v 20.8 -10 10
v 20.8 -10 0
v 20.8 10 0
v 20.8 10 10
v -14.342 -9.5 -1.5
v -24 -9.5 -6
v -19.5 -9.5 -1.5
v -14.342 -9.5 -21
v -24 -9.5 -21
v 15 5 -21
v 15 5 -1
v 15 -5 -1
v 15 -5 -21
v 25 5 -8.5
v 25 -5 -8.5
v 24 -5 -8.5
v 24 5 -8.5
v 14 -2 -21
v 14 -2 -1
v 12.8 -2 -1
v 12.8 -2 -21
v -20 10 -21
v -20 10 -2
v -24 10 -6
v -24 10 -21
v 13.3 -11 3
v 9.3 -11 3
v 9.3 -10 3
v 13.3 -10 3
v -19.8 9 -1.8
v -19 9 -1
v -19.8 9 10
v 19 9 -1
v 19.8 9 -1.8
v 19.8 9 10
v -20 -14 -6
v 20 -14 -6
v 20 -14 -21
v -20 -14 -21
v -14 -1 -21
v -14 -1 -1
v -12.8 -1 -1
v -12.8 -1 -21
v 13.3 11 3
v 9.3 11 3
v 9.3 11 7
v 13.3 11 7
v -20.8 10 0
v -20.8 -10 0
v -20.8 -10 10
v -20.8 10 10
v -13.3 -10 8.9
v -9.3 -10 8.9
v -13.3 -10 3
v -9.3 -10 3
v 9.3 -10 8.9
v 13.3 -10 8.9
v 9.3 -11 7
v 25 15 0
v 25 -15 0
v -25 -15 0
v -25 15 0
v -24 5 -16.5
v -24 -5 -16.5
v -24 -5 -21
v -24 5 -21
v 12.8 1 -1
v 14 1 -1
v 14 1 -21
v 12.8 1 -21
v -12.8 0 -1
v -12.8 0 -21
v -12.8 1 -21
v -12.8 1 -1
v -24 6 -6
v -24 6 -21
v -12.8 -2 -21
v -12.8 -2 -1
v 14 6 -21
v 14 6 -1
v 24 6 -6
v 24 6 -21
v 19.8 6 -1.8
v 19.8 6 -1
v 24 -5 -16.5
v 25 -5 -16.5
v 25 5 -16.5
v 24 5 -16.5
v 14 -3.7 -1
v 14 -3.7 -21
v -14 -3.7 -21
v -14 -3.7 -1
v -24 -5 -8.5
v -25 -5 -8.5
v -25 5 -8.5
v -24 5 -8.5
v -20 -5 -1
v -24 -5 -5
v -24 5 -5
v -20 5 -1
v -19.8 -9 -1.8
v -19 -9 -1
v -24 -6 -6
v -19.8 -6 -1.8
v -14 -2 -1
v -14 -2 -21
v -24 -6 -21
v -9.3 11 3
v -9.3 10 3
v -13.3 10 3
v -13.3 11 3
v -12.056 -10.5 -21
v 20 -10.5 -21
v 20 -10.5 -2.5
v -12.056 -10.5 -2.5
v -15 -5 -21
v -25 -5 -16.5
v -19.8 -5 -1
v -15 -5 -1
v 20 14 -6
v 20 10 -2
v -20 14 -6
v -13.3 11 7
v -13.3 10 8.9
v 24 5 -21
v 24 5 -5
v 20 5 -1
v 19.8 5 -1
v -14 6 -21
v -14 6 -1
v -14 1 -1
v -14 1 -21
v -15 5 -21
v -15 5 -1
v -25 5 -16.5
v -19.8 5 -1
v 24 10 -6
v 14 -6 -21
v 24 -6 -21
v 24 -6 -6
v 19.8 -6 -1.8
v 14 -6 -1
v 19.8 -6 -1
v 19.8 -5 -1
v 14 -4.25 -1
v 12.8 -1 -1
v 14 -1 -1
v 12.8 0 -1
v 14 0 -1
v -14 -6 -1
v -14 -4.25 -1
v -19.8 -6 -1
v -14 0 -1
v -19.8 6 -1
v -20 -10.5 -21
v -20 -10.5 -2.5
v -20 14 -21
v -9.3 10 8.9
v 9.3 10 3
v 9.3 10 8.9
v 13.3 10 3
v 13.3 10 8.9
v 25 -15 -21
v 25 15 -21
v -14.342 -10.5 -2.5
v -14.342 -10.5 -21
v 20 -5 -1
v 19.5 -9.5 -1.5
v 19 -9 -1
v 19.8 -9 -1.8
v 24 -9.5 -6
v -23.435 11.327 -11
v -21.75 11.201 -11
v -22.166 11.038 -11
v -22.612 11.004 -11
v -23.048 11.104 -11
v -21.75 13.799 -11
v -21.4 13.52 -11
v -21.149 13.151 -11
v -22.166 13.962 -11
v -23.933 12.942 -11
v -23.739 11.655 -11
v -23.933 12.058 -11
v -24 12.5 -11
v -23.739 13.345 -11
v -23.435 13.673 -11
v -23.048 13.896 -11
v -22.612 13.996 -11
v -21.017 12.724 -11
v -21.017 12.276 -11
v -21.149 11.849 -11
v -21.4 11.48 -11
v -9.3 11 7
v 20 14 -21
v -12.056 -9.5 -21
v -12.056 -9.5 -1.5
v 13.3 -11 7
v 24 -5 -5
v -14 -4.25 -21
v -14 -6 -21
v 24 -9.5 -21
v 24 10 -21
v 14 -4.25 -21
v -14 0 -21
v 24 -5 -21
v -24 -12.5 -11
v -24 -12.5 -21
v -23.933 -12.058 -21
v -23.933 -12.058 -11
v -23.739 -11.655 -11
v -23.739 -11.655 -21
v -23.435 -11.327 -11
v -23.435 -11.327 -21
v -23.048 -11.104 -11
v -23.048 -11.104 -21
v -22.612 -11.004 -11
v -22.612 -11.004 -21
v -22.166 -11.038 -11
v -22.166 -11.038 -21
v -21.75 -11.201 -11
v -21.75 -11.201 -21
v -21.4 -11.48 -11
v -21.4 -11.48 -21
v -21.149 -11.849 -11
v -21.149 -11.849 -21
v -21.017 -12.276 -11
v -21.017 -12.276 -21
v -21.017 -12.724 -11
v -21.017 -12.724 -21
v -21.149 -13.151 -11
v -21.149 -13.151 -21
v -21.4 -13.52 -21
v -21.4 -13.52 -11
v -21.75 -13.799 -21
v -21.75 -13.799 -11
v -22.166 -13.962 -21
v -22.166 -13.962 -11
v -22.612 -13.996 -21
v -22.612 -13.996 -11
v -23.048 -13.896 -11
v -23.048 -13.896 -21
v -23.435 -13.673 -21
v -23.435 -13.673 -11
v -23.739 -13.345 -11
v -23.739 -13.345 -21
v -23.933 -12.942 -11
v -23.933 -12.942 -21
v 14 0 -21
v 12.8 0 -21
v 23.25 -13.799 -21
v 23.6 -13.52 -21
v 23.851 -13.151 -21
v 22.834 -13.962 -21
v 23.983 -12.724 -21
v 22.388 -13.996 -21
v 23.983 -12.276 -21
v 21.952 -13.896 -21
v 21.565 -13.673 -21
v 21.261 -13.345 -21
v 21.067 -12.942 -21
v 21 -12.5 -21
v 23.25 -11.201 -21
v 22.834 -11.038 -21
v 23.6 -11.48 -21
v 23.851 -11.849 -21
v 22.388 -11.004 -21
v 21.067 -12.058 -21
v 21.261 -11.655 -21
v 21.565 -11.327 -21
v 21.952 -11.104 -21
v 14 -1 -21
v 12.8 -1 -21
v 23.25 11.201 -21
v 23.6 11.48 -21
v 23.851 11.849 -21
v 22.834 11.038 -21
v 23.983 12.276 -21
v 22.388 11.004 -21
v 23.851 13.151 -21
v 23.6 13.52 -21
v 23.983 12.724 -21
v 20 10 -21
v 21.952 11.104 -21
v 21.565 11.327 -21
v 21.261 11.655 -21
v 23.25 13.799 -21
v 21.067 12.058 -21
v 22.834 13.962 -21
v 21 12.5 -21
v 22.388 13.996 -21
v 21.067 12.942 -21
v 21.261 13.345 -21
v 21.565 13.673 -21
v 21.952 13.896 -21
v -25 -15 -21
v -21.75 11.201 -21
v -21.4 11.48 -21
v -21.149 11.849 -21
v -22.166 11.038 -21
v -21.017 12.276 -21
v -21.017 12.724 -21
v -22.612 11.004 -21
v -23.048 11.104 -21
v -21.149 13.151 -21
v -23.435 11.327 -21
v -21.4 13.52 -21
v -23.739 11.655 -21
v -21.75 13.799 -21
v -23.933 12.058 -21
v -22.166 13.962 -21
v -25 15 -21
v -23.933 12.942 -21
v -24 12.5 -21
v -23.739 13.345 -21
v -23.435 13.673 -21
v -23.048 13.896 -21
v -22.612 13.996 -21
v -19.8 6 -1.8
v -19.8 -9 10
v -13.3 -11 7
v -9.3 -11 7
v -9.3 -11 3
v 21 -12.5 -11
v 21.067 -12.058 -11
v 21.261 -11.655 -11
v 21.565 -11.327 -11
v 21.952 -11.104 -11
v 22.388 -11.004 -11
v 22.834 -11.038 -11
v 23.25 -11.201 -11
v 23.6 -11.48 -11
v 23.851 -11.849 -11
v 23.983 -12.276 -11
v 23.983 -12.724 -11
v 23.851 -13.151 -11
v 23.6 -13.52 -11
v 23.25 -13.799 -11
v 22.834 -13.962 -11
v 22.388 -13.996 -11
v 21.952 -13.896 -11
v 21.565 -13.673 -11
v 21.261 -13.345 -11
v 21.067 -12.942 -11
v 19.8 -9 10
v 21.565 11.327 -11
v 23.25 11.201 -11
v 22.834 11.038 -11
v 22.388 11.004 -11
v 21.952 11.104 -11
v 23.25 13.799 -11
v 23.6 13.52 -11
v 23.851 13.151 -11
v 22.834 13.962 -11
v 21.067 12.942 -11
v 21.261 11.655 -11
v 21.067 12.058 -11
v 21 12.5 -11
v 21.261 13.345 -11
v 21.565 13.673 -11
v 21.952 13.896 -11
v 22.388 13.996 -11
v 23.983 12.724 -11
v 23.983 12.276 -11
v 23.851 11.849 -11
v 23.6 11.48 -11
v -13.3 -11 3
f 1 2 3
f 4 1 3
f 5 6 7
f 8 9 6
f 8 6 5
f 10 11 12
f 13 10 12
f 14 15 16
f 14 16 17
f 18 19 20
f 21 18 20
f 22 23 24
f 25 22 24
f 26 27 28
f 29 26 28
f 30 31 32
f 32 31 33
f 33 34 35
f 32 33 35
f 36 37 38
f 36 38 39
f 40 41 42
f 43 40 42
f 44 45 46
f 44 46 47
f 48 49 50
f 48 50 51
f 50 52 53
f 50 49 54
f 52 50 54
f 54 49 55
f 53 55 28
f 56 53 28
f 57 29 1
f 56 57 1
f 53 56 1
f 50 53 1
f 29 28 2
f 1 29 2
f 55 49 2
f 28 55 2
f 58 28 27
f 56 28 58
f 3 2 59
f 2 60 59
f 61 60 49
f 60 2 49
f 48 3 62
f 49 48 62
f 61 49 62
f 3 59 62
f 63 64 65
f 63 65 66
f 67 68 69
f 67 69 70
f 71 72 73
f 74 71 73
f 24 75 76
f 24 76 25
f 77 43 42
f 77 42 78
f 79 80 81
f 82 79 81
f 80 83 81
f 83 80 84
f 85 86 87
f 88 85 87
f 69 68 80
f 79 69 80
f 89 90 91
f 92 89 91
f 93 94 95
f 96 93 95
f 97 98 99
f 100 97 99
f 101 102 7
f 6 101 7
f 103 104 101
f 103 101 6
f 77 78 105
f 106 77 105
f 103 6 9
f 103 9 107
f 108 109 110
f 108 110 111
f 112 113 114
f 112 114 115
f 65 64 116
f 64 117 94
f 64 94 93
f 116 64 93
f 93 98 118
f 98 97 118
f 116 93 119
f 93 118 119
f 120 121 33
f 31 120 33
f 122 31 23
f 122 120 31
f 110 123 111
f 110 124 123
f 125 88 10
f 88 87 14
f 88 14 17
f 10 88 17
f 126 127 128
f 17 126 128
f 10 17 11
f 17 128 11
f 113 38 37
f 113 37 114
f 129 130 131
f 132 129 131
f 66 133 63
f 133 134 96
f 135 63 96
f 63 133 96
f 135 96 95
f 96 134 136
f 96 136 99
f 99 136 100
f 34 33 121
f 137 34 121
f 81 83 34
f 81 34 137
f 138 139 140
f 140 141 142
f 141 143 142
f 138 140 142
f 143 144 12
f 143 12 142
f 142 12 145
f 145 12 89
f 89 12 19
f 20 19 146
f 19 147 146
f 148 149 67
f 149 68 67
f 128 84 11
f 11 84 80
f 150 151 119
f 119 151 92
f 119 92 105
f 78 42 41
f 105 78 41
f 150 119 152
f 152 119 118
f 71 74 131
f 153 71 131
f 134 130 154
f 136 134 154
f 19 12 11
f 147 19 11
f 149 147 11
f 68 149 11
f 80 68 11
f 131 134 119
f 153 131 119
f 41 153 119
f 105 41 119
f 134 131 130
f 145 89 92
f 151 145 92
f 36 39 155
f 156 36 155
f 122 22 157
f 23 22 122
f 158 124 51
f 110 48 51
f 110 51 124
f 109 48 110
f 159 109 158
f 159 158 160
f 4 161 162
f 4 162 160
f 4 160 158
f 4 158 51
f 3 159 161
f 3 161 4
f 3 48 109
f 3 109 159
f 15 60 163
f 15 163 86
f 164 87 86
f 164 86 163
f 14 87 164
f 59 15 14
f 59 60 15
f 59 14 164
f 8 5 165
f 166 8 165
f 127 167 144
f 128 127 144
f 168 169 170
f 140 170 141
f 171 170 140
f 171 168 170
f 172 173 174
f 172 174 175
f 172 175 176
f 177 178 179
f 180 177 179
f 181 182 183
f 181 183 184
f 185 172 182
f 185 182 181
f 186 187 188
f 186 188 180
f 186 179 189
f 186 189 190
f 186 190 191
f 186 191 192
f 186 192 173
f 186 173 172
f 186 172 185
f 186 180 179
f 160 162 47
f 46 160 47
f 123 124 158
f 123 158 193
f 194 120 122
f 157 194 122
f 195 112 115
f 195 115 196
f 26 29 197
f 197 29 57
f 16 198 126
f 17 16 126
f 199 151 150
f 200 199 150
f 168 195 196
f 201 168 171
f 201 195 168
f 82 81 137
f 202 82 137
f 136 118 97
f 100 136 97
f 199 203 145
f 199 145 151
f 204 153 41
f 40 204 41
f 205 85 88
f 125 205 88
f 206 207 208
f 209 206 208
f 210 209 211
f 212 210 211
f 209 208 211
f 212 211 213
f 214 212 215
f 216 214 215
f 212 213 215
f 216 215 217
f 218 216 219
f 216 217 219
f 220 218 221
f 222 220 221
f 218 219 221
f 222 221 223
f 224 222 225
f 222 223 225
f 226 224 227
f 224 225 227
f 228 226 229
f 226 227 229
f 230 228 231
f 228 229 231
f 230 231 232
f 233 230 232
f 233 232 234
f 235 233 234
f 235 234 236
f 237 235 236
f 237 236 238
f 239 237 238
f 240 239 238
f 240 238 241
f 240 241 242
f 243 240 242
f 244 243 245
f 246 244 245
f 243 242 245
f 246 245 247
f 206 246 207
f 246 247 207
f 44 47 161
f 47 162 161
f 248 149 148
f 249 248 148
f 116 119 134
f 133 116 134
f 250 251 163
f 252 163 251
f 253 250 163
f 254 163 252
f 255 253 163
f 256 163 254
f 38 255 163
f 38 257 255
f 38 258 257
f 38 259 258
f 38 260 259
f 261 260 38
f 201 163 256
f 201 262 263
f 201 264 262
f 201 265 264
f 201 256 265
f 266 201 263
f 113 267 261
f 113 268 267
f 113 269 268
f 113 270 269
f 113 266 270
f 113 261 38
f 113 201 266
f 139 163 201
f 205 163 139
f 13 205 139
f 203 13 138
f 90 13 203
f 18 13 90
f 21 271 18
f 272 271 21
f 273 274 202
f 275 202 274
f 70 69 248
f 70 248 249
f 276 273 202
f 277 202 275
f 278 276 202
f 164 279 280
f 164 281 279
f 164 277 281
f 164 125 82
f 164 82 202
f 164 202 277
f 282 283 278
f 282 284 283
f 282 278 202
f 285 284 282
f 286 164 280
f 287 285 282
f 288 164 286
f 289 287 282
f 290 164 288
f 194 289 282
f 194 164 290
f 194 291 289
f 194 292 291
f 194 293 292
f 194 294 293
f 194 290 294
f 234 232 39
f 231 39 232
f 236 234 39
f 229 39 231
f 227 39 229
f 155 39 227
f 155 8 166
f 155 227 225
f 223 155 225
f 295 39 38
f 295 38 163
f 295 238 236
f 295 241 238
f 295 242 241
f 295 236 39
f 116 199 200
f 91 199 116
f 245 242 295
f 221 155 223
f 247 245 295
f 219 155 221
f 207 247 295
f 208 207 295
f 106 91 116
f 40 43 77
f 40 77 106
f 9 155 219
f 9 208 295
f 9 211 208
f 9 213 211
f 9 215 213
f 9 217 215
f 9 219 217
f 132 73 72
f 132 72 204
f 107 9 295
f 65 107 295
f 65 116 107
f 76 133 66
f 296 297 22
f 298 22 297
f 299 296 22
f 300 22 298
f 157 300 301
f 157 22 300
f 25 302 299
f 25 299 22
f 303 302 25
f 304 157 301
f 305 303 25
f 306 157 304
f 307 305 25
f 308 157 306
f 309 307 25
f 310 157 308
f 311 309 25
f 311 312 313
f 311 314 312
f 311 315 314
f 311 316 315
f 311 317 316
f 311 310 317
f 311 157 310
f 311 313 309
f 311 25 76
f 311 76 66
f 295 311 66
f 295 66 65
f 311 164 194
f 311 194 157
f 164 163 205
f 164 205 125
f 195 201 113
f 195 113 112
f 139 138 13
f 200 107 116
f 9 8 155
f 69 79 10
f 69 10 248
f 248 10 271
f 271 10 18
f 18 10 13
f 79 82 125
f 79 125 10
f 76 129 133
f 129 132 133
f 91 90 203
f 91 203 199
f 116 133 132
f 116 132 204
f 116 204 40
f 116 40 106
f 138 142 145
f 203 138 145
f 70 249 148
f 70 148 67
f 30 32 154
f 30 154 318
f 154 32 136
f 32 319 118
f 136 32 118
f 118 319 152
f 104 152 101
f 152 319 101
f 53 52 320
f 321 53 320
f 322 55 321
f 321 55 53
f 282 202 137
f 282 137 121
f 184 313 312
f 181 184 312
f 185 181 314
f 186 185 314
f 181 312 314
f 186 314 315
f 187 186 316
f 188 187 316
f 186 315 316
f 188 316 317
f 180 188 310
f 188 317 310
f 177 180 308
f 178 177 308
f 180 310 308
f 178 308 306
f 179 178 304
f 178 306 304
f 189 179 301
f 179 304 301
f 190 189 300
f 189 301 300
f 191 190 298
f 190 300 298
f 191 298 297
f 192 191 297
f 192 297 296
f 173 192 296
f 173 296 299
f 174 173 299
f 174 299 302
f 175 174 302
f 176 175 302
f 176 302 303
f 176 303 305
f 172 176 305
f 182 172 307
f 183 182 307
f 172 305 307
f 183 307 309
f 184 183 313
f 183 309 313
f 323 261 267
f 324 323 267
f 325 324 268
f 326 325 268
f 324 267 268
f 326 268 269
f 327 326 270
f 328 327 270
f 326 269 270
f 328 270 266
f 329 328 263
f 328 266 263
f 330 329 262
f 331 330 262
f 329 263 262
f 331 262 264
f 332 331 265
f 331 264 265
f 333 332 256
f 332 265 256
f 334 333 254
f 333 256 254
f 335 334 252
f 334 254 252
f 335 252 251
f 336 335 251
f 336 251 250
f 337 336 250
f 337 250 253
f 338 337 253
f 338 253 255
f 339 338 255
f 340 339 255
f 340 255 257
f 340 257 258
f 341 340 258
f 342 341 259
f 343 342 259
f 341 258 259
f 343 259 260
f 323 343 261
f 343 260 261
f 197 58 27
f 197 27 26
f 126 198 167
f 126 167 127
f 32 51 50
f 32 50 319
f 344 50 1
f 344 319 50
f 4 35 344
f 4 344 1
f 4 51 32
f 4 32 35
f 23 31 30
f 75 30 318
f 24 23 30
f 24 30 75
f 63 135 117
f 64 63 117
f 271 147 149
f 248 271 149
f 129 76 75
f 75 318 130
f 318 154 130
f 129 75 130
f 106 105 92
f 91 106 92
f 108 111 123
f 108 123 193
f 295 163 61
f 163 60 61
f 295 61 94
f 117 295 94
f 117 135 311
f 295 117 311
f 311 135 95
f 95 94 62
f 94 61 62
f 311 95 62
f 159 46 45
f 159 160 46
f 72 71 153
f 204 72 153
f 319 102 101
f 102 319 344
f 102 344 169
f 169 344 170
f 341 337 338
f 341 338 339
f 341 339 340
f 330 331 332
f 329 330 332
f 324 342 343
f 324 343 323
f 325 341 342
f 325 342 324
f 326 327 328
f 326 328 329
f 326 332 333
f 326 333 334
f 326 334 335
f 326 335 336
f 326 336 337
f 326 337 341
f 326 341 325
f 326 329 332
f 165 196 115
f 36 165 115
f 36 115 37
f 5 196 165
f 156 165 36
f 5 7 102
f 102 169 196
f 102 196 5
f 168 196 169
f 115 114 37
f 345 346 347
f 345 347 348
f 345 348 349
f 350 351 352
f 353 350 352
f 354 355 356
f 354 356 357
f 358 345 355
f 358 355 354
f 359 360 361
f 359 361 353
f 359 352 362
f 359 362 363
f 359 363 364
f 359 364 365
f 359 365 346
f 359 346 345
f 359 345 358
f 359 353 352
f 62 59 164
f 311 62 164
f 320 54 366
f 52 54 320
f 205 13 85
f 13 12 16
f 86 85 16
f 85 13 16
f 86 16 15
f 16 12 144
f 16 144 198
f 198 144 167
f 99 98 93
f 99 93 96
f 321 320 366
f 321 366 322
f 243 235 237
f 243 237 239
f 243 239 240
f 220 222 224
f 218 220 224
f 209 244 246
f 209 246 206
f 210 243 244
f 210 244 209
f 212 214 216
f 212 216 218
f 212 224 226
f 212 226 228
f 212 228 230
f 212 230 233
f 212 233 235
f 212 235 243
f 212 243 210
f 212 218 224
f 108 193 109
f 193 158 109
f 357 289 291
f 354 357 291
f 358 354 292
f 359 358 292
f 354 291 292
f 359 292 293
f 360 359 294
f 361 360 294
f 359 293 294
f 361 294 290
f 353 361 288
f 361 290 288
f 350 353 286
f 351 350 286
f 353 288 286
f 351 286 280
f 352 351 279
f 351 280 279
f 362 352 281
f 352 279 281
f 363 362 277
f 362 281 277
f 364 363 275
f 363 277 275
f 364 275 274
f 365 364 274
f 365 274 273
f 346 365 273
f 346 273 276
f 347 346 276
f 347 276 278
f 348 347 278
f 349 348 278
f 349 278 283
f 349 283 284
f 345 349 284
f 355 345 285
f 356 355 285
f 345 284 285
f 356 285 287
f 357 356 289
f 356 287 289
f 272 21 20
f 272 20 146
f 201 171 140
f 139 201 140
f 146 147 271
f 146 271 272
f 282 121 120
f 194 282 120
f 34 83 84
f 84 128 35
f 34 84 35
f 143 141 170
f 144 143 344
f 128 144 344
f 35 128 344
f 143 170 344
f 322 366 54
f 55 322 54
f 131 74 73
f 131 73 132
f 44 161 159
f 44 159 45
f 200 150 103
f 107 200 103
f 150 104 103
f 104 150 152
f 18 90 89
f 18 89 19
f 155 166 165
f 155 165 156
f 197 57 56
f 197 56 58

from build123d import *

# Parameters (mm, degrees)
SKETCH1_W            = 41.6
SKETCH1_H            = 20
SKETCH1_W_2          = 39.6
SKETCH1_H_2          = 18
BOSS_EXTRUDE2_DEPTH  = 10
SKETCH2_W            = 4
SKETCH2_H            = 10
BOSS_EXTRUDE3_DEPTH  = 1
SKETCH3_W            = 3
SKETCH3_H            = 1
CUT_EXTRUDE1_DEPTH   = 27
SKETCH4_W            = 4
SKETCH4_H            = 10
BOSS_EXTRUDE4_DEPTH  = 1
SKETCH5_W            = 3
SKETCH5_H            = 1
CUT_EXTRUDE2_DEPTH   = 27
SKETCH6_W            = 50
SKETCH6_H            = 30
SKETCH6_W_2          = 41.6
SKETCH6_H_2          = 20
SKETCH6_W_3          = 39.6
SKETCH6_H_3          = 18
BOSS_EXTRUDE6_DEPTH  = 1
SKETCH7_W            = 50
SKETCH7_H            = 30
SKETCH7_W_2          = 48
SKETCH7_H_2          = 28
BOSS_EXTRUDE7_DEPTH  = 20
SKETCH8_W            = 4.2
SKETCH8_H            = 1
BOSS_EXTRUDE8_DEPTH  = 20
SKETCH9_W            = 4.2
SKETCH9_H            = 1
BOSS_EXTRUDE9_DEPTH  = 20
SKETCH10_W           = 4
SKETCH10_H           = 4
BOSS_EXTRUDE10_DEPTH = 20
SKETCH11_W           = 2
SKETCH11_H           = 10
CUT_EXTRUDE3_DEPTH   = 1
SKETCH12_W           = 2
SKETCH12_H           = 10
CUT_EXTRUDE4_DEPTH   = 1
SKETCH13_R           = 1.5
CUT_EXTRUDE5_DEPTH   = 10
CHAMFER2_SIZE        = 5
CHAMFER3_SIZE        = 5
CHAMFER4_SIZE        = 4
SKETCH16_W           = 1.2
SKETCH16_H           = 1
BOSS_EXTRUDE11_DEPTH = 20
BOSS_EXTRUDE12_DEPTH = 20
SKETCH18_W           = 28
SKETCH18_H           = 0.549749779
BOSS_EXTRUDE13_DEPTH = 20


# Some blends are built 0.0001 mm under size
with BuildPart() as part:
    # Sketch1 → Boss-Extrude2 (new body)
    with BuildSketch(Plane.XY):
        Rectangle(SKETCH1_W, SKETCH1_H)
        Rectangle(SKETCH1_W_2, SKETCH1_H_2, mode=Mode.SUBTRACT)
    extrude(amount=BOSS_EXTRUDE2_DEPTH)

    # Sketch2 → Boss-Extrude3 (add)
    with BuildSketch(Plane.XZ.offset(10)):
        with Locations((-11.3, 5)):
            Rectangle(SKETCH2_W, SKETCH2_H)
        with Locations((11.3, 5)):
            Rectangle(SKETCH2_W, SKETCH2_H)
    extrude(amount=BOSS_EXTRUDE3_DEPTH)

    # Sketch3 → Cut-Extrude1 (cut)
    with BuildSketch(Plane.ZY.offset(13.3)):
        Polygon((8.900149248, -10), (7, -11), (10, -11), (10, -10), align=None)
        with Locations((1.5, -10.5)):
            Rectangle(SKETCH3_W, SKETCH3_H)
    extrude(amount=-CUT_EXTRUDE1_DEPTH, mode=Mode.SUBTRACT)

    # Sketch4 → Boss-Extrude4 (add)
    with BuildSketch(Plane(origin=(0, 10, 0), x_dir=(1, 0, 0), z_dir=(0, 1, 0))):
        with Locations((11.3, -5)):
            Rectangle(SKETCH4_W, SKETCH4_H)
        with Locations((-11.3, -5)):
            Rectangle(SKETCH4_W, SKETCH4_H)
    extrude(amount=BOSS_EXTRUDE4_DEPTH)

    # Sketch5 → Cut-Extrude2 (cut)
    with BuildSketch(Plane(origin=(13.3, 0, 0), x_dir=(0, 0, -1), z_dir=(1, 0, 0))):
        Polygon((-7, 11), (-10, 11), (-10, 10), (-8.900149248, 10), align=None)
        with Locations((-1.5, 10.5)):
            Rectangle(SKETCH5_W, SKETCH5_H)
    extrude(amount=-CUT_EXTRUDE2_DEPTH, mode=Mode.SUBTRACT)

    # Sketch6 → Boss-Extrude6 (add)
    # profile 1 of 2: a face of its own
    with BuildSketch(Plane(origin=(0, 0, 0), x_dir=(-1, 0, 0), z_dir=(0, 0, -1))):
        Rectangle(SKETCH6_W, SKETCH6_H)
        Rectangle(SKETCH6_W_2, SKETCH6_H_2, mode=Mode.SUBTRACT)
    # profile 2 of 2: a face of its own
    with BuildSketch(Plane(origin=(0, 0, 0), x_dir=(-1, 0, 0), z_dir=(0, 0, -1))):
        Rectangle(SKETCH6_W_2, SKETCH6_H_2)
        Rectangle(SKETCH6_W_3, SKETCH6_H_3, mode=Mode.SUBTRACT)
    extrude(amount=BOSS_EXTRUDE6_DEPTH)

    # Sketch7 → Boss-Extrude7 (add)
    with BuildSketch(Plane(origin=(0, 0, -1), x_dir=(-1, 0, 0), z_dir=(0, 0, -1))):
        Rectangle(SKETCH7_W, SKETCH7_H)
        Rectangle(SKETCH7_W_2, SKETCH7_H_2, mode=Mode.SUBTRACT)
    extrude(amount=BOSS_EXTRUDE7_DEPTH)

    # Sketch8 → Boss-Extrude8 (add)
    with BuildSketch(Plane(origin=(0, 0, -1), x_dir=(-1, 0, 0), z_dir=(0, 0, -1))):
        Polygon((-15, -5), (-19.8, -5), (-19.8, -6), (-14, -6), (-14, 6), (-19.8, 6), (-19.8, 5), (-15, 5), align=None)
        with Locations((-21.9, 5.5)):
            Rectangle(SKETCH8_W, SKETCH8_H)
        with Locations((-21.9, -5.5)):
            Rectangle(SKETCH8_W, SKETCH8_H)
    extrude(amount=BOSS_EXTRUDE8_DEPTH)

    # Sketch9 → Boss-Extrude9 (add)
    with BuildSketch(Plane(origin=(0, 0, -1), x_dir=(-1, 0, 0), z_dir=(0, 0, -1))):
        Polygon((15, 5), (19.8, 5), (19.8, 6), (14, 6), (14, -6), (19.8, -6), (19.8, -5), (15, -5), align=None)
        with Locations((21.9, 5.5)):
            Rectangle(SKETCH9_W, SKETCH9_H)
        with Locations((21.9, -5.5)):
            Rectangle(SKETCH9_W, SKETCH9_H)
    extrude(amount=BOSS_EXTRUDE9_DEPTH)

    # Sketch10 → Boss-Extrude10 (add)
    with BuildSketch(Plane(origin=(0, 0, -1), x_dir=(-1, 0, 0), z_dir=(0, 0, -1))):
        with Locations((-22, 12)):
            Rectangle(SKETCH10_W, SKETCH10_H)
        with Locations((22, 12)):
            Rectangle(SKETCH10_W, SKETCH10_H)
        with Locations((22, -12)):
            Rectangle(SKETCH10_W, SKETCH10_H)
        with Locations((-22, -12)):
            Rectangle(SKETCH10_W, SKETCH10_H)
    extrude(amount=BOSS_EXTRUDE10_DEPTH)

    # Sketch11 → Cut-Extrude3 (cut)
    with BuildSketch(Plane.ZY.offset(25)):
        Polygon((-10.5, -5), (-10.5, 5), (-16.5, 5), (-16.5, 0), (-16.5, -5), align=None)
        with Locations((-9.5, 0)):
            Rectangle(SKETCH11_W, SKETCH11_H)
    extrude(amount=-CUT_EXTRUDE3_DEPTH, mode=Mode.SUBTRACT)

    # Sketch12 → Cut-Extrude4 (cut)
    with BuildSketch(Plane(origin=(25, 0, 0), x_dir=(0, 0, -1), z_dir=(1, 0, 0))):
        with Locations((9.5, 0)):
            Rectangle(SKETCH12_W, SKETCH12_H)
        Polygon((16.5, 5), (10.5, 5), (10.5, -5), (16.5, -5), (16.5, 0), align=None)
    extrude(amount=-CUT_EXTRUDE4_DEPTH, mode=Mode.SUBTRACT)

    # Sketch13 → Cut-Extrude5 (cut)
    with BuildSketch(Plane(origin=(0, 0, -21), x_dir=(-1, 0, 0), z_dir=(0, 0, -1))):
        with Locations((-22.5, 12.5)):
            Circle(SKETCH13_R)
        with Locations((22.5, 12.5)):
            Circle(SKETCH13_R)
        with Locations((22.5, -12.5)):
            Circle(SKETCH13_R)
        with Locations((-22.5, -12.5)):
            Circle(SKETCH13_R)
    extrude(amount=-CUT_EXTRUDE5_DEPTH, mode=Mode.SUBTRACT)

    # Chamfer2
    chamfer2_edges = [part.edges().sort_by_distance(p)[0] for p in [
        (0, 14, -1),
        (0, -14, -1),
    ]]
    chamfer(chamfer2_edges, length=CHAMFER2_SIZE - 0.0001)  # a hair under: the kernel refuses the full size

    # Chamfer3
    # the kernel refuses this chamfer: 5 mm, written as the material it adds along each edge
    with BuildSketch(Plane(origin=(24, -21.85851494, -1), x_dir=(-0.9996219169112968, 0, 0.02749587661058636), z_dir=(0, 1, 0))) as chamfer3_piece_1_section:
        Polygon((CHAMFER3_SIZE * 0.999621916911, -CHAMFER3_SIZE * 0.0274958766106), (-CHAMFER3_SIZE * 0.0274958766106, -CHAMFER3_SIZE * 0.999621916911), (0, 0), align=None)
    chamfer3_piece_1 = extrude(amount=28.71692988, mode=Mode.PRIVATE)
    chamfer3_piece_1 = split(chamfer3_piece_1, bisect_by=Plane(origin=(19.8, -10.000025, -1.99995), z_dir=(1, 0, 0)), keep=Keep.TOP, mode=Mode.PRIVATE)
    chamfer3_piece_1 = split(chamfer3_piece_1, bisect_by=Plane(origin=(19.999975, -5, -1.99995), z_dir=(0, -1, 0)), keep=Keep.TOP, mode=Mode.PRIVATE)
    chamfer3_piece_1 = split(chamfer3_piece_1, bisect_by=Plane(origin=(19.999975, -10.0000375, -1.9999375), z_dir=(0, 0.7071067811865476, -0.7071067811865476)), keep=Keep.TOP, mode=Mode.PRIVATE)
    add(chamfer3_piece_1)
    with BuildSketch(Plane(origin=(24, -21.85851494, -1), x_dir=(-0.9996219169112968, 0, 0.02749587661058636), z_dir=(0, 1, 0))) as chamfer3_piece_2_section:
        Polygon((CHAMFER3_SIZE * 0.999621916911, -CHAMFER3_SIZE * 0.0274958766106), (-CHAMFER3_SIZE * 0.0274958766106, -CHAMFER3_SIZE * 0.999621916911), (0, 0), align=None)
    chamfer3_piece_2 = extrude(amount=28.71692988, mode=Mode.PRIVATE)
    chamfer3_piece_2 = split(chamfer3_piece_2, bisect_by=Plane(origin=(19.599975009, -9, -1.399950019), z_dir=(0, -1, 0)), keep=Keep.TOP, mode=Mode.PRIVATE)
    chamfer3_piece_2 = split(chamfer3_piece_2, bisect_by=Plane(origin=(19.599975009, -9.300037514, -1.299937514), z_dir=(0, 0.7071067811865476, -0.7071067811865476)), keep=Keep.TOP, mode=Mode.PRIVATE)
    add(chamfer3_piece_2)
    with BuildSketch(Plane(origin=(24, -21.85851494, -1), x_dir=(-0.9996219169112968, 0, 0.02749587661058636), z_dir=(0, 1, 0))) as chamfer3_piece_3_section:
        Polygon((CHAMFER3_SIZE * 0.999621916911, -CHAMFER3_SIZE * 0.0274958766106), (-CHAMFER3_SIZE * 0.0274958766106, -CHAMFER3_SIZE * 0.999621916911), (0, 0), align=None)
    chamfer3_piece_3 = extrude(amount=28.71692988, mode=Mode.PRIVATE)
    chamfer3_piece_3 = split(chamfer3_piece_3, bisect_by=Plane(origin=(19.8, 6.42920747, -1.451851852), z_dir=(1, 0, 0)), keep=Keep.TOP, mode=Mode.PRIVATE)
    chamfer3_piece_3 = split(chamfer3_piece_3, bisect_by=Plane(origin=(19.903703704, 5, -1.451851852), z_dir=(0, 1, 0)), keep=Keep.TOP, mode=Mode.PRIVATE)
    add(chamfer3_piece_3)
    with BuildSketch(Plane(origin=(-24, 21.85851494, -1), x_dir=(0.9996219169112968, 0, 0.02749587661058636), z_dir=(0, -1, 0))) as chamfer3_piece_4_section:
        Polygon((CHAMFER3_SIZE * 0.999621916911, -CHAMFER3_SIZE * 0.0274958766106), (-CHAMFER3_SIZE * 0.0274958766106, -CHAMFER3_SIZE * 0.999621916911), (0, 0), align=None)
    chamfer3_piece_4 = extrude(amount=28.71692988, mode=Mode.PRIVATE)
    chamfer3_piece_4 = split(chamfer3_piece_4, bisect_by=Plane(origin=(-19.8, 10.000025, -1.99995), z_dir=(-1, 0, 0)), keep=Keep.TOP, mode=Mode.PRIVATE)
    chamfer3_piece_4 = split(chamfer3_piece_4, bisect_by=Plane(origin=(-19.999975, 15, -1.99995), z_dir=(0, -1, 0)), keep=Keep.TOP, mode=Mode.PRIVATE)
    chamfer3_piece_4 = split(chamfer3_piece_4, bisect_by=Plane(origin=(-19.999975, 5, -1.99995), z_dir=(0, 1, 0)), keep=Keep.TOP, mode=Mode.PRIVATE)
    add(chamfer3_piece_4)
    with BuildSketch(Plane(origin=(-24, 21.85851494, -1), x_dir=(0.9996219169112968, 0, 0.02749587661058636), z_dir=(0, -1, 0))) as chamfer3_piece_5_section:
        Polygon((CHAMFER3_SIZE * 0.999621916911, -CHAMFER3_SIZE * 0.0274958766106), (-CHAMFER3_SIZE * 0.0274958766106, -CHAMFER3_SIZE * 0.999621916911), (0, 0), align=None)
    chamfer3_piece_5 = extrude(amount=28.71692988, mode=Mode.PRIVATE)
    chamfer3_piece_5 = split(chamfer3_piece_5, bisect_by=Plane(origin=(-19.599975009, 9, -1.399950019), z_dir=(0, 1, 0)), keep=Keep.TOP, mode=Mode.PRIVATE)
    chamfer3_piece_5 = split(chamfer3_piece_5, bisect_by=Plane(origin=(-19.599975009, 15, -1.399950019), z_dir=(0, -1, 0)), keep=Keep.TOP, mode=Mode.PRIVATE)
    add(chamfer3_piece_5)
    with BuildSketch(Plane(origin=(-24, 21.85851494, -1), x_dir=(0.9996219169112968, 0, 0.02749587661058636), z_dir=(0, -1, 0))) as chamfer3_piece_6_section:
        Polygon((CHAMFER3_SIZE * 0.999621916911, -CHAMFER3_SIZE * 0.0274958766106), (-CHAMFER3_SIZE * 0.0274958766106, -CHAMFER3_SIZE * 0.999621916911), (0, 0), align=None)
    chamfer3_piece_6 = extrude(amount=28.71692988, mode=Mode.PRIVATE)
    chamfer3_piece_6 = split(chamfer3_piece_6, bisect_by=Plane(origin=(-19.8, -6.42920747, -1.451851852), z_dir=(-1, 0, 0)), keep=Keep.TOP, mode=Mode.PRIVATE)
    chamfer3_piece_6 = split(chamfer3_piece_6, bisect_by=Plane(origin=(-19.903703704, -6, -1.451851852), z_dir=(0, -1, 0)), keep=Keep.TOP, mode=Mode.PRIVATE)
    add(chamfer3_piece_6)
    with BuildSketch(Plane(origin=(-24, 6.85841494, -1), x_dir=(0.9996219169112968, 0, 0.02749587661058636), z_dir=(0, -1, 0))) as chamfer3_piece_7_section:
        Polygon((CHAMFER3_SIZE * 0.999621916911, -CHAMFER3_SIZE * 0.0274958766106), (-CHAMFER3_SIZE * 0.0274958766106, -CHAMFER3_SIZE * 0.999621916911), (0, 0), align=None)
    chamfer3_piece_7 = extrude(amount=28.71692988, mode=Mode.PRIVATE)
    chamfer3_piece_7 = split(chamfer3_piece_7, bisect_by=Plane(origin=(-19.8, 6.42920747, -1.451851852), z_dir=(-1, 0, 0)), keep=Keep.TOP, mode=Mode.PRIVATE)
    chamfer3_piece_7 = split(chamfer3_piece_7, bisect_by=Plane(origin=(-19.903703704, 5, -1.451851852), z_dir=(0, 1, 0)), keep=Keep.TOP, mode=Mode.PRIVATE)
    add(chamfer3_piece_7)
    with BuildSketch(Plane(origin=(-24, -6, -1), x_dir=(0.9996219169112968, 0, 0.02749587661058636), z_dir=(0, -1, 0))) as chamfer3_piece_8_section:
        Polygon((CHAMFER3_SIZE * 0.999621916911, -CHAMFER3_SIZE * 0.0274958766106), (-CHAMFER3_SIZE * 0.0274958766106, -CHAMFER3_SIZE * 0.999621916911), (0, 0), align=None)
    chamfer3_piece_8 = extrude(amount=15.85851494, mode=Mode.PRIVATE)
    chamfer3_piece_8 = split(chamfer3_piece_8, bisect_by=Plane(origin=(-19.8, -7.5, -1.451851852), z_dir=(-1, 0, 0)), keep=Keep.TOP, mode=Mode.PRIVATE)
    chamfer3_piece_8 = split(chamfer3_piece_8, bisect_by=Plane(origin=(-19.903703704, -8.475975926, -0.475875926), z_dir=(0, 0.7071067811865476, -0.7071067811865476)), keep=Keep.TOP, mode=Mode.PRIVATE)
    add(chamfer3_piece_8)
    with BuildSketch(Plane(origin=(-24, 6.85841494, -1), x_dir=(0.9996219169112968, 0, 0.02749587661058636), z_dir=(0, -1, 0))) as chamfer3_piece_9_section:
        Polygon((CHAMFER3_SIZE * 0.999621916911, -CHAMFER3_SIZE * 0.0274958766106), (-CHAMFER3_SIZE * 0.0274958766106, -CHAMFER3_SIZE * 0.999621916911), (0, 0), align=None)
    chamfer3_piece_9 = extrude(amount=28.71692988, mode=Mode.PRIVATE)
    chamfer3_piece_9 = split(chamfer3_piece_9, bisect_by=Plane(origin=(-19.599975009, -9, -1.399950019), z_dir=(0, -1, 0)), keep=Keep.TOP, mode=Mode.PRIVATE)
    chamfer3_piece_9 = split(chamfer3_piece_9, bisect_by=Plane(origin=(-19.599975009, -9.300037514, -1.299937514), z_dir=(0, 0.7071067811865476, -0.7071067811865476)), keep=Keep.TOP, mode=Mode.PRIVATE)
    add(chamfer3_piece_9)
    with BuildSketch(Plane(origin=(24, -6.85841494, -1), x_dir=(-0.9996219169112968, 0, 0.02749587661058636), z_dir=(0, 1, 0))) as chamfer3_piece_10_section:
        Polygon((CHAMFER3_SIZE * 0.999621916911, -CHAMFER3_SIZE * 0.0274958766106), (-CHAMFER3_SIZE * 0.0274958766106, -CHAMFER3_SIZE * 0.999621916911), (0, 0), align=None)
    chamfer3_piece_10 = extrude(amount=28.71692988, mode=Mode.PRIVATE)
    chamfer3_piece_10 = split(chamfer3_piece_10, bisect_by=Plane(origin=(19.8, -6.42920747, -1.451851852), z_dir=(1, 0, 0)), keep=Keep.TOP, mode=Mode.PRIVATE)
    chamfer3_piece_10 = split(chamfer3_piece_10, bisect_by=Plane(origin=(19.903703704, -5, -1.451851852), z_dir=(0, -1, 0)), keep=Keep.TOP, mode=Mode.PRIVATE)
    add(chamfer3_piece_10)
    with BuildSketch(Plane(origin=(24, -6.85841494, -1), x_dir=(-0.9996219169112968, 0, 0.02749587661058636), z_dir=(0, 1, 0))) as chamfer3_piece_11_section:
        Polygon((CHAMFER3_SIZE * 0.999621916911, -CHAMFER3_SIZE * 0.0274958766106), (-CHAMFER3_SIZE * 0.0274958766106, -CHAMFER3_SIZE * 0.999621916911), (0, 0), align=None)
    chamfer3_piece_11 = extrude(amount=28.71692988, mode=Mode.PRIVATE)
    chamfer3_piece_11 = split(chamfer3_piece_11, bisect_by=Plane(origin=(19.8, 7.5, -1.451851852), z_dir=(1, 0, 0)), keep=Keep.TOP, mode=Mode.PRIVATE)
    chamfer3_piece_11 = split(chamfer3_piece_11, bisect_by=Plane(origin=(19.903703704, 15, -1.451851852), z_dir=(0, -1, 0)), keep=Keep.TOP, mode=Mode.PRIVATE)
    chamfer3_piece_11 = split(chamfer3_piece_11, bisect_by=Plane(origin=(19.903703704, 5, -1.451851852), z_dir=(0, 1, 0)), keep=Keep.TOP, mode=Mode.PRIVATE)
    add(chamfer3_piece_11)
    with BuildSketch(Plane(origin=(24, -6.85841494, -1), x_dir=(-0.9996219169112968, 0, 0.02749587661058636), z_dir=(0, 1, 0))) as chamfer3_piece_12_section:
        Polygon((CHAMFER3_SIZE * 0.999621916911, -CHAMFER3_SIZE * 0.0274958766106), (-CHAMFER3_SIZE * 0.0274958766106, -CHAMFER3_SIZE * 0.999621916911), (0, 0), align=None)
    chamfer3_piece_12 = extrude(amount=28.71692988, mode=Mode.PRIVATE)
    chamfer3_piece_12 = split(chamfer3_piece_12, bisect_by=Plane(origin=(19.599975009, 9, -1.399950019), z_dir=(0, 1, 0)), keep=Keep.TOP, mode=Mode.PRIVATE)
    chamfer3_piece_12 = split(chamfer3_piece_12, bisect_by=Plane(origin=(19.599975009, 15, -1.399950019), z_dir=(0, -1, 0)), keep=Keep.TOP, mode=Mode.PRIVATE)
    add(chamfer3_piece_12)

    # Chamfer4
    chamfer4_edges = [part.edges().sort_by_distance(p)[0] for p in [
        (24, 0, -1),
        (-24, 0, -1),
    ]]
    chamfer(chamfer4_edges, length=CHAMFER4_SIZE)

    # Sketch16 → Boss-Extrude11 (add)
    with BuildSketch(Plane(origin=(0, 0, -21), x_dir=(-1, 0, 0), z_dir=(0, 0, -1))):
        with Locations((-13.4, 0.5)):
            Rectangle(SKETCH16_W, SKETCH16_H)
        with Locations((-13.4, -1.5)):
            Rectangle(SKETCH16_W, SKETCH16_H)
        with Locations((13.4, 0.5)):
            Rectangle(SKETCH16_W, SKETCH16_H)
        Polygon((13, -1), (12.8, -1), (12.8, -2), (14, -2), (14, -1), align=None)
    extrude(amount=-BOSS_EXTRUDE11_DEPTH)

    # Sketch17 → Boss-Extrude12 (add)
    with BuildSketch(Plane(origin=(0, 0, -21), x_dir=(-1, 0, 0), z_dir=(0, 0, -1))):
        Polygon((-20, -10), (-20, -10.5), (-16.744161901, -10.5), (12.056353702, -10.5), (12.056353702, -9.5), (-24, -9.5), (-24, -10), align=None)
        Polygon((14.342415664, -9.5), (14.342415664, -10.5), (20, -10.5), (20, -10), (24, -10), (24, -9.5), align=None)
    extrude(amount=-BOSS_EXTRUDE12_DEPTH)

    # Sketch18 → Boss-Extrude13 (add)
    with BuildSketch(Plane(origin=(0, 0, -21), x_dir=(-1, 0, 0), z_dir=(0, 0, -1))):
        with Locations((0, -3.97487489)):
            Rectangle(SKETCH18_W, SKETCH18_H)
    extrude(amount=-BOSS_EXTRUDE13_DEPTH)


solid = part.part
